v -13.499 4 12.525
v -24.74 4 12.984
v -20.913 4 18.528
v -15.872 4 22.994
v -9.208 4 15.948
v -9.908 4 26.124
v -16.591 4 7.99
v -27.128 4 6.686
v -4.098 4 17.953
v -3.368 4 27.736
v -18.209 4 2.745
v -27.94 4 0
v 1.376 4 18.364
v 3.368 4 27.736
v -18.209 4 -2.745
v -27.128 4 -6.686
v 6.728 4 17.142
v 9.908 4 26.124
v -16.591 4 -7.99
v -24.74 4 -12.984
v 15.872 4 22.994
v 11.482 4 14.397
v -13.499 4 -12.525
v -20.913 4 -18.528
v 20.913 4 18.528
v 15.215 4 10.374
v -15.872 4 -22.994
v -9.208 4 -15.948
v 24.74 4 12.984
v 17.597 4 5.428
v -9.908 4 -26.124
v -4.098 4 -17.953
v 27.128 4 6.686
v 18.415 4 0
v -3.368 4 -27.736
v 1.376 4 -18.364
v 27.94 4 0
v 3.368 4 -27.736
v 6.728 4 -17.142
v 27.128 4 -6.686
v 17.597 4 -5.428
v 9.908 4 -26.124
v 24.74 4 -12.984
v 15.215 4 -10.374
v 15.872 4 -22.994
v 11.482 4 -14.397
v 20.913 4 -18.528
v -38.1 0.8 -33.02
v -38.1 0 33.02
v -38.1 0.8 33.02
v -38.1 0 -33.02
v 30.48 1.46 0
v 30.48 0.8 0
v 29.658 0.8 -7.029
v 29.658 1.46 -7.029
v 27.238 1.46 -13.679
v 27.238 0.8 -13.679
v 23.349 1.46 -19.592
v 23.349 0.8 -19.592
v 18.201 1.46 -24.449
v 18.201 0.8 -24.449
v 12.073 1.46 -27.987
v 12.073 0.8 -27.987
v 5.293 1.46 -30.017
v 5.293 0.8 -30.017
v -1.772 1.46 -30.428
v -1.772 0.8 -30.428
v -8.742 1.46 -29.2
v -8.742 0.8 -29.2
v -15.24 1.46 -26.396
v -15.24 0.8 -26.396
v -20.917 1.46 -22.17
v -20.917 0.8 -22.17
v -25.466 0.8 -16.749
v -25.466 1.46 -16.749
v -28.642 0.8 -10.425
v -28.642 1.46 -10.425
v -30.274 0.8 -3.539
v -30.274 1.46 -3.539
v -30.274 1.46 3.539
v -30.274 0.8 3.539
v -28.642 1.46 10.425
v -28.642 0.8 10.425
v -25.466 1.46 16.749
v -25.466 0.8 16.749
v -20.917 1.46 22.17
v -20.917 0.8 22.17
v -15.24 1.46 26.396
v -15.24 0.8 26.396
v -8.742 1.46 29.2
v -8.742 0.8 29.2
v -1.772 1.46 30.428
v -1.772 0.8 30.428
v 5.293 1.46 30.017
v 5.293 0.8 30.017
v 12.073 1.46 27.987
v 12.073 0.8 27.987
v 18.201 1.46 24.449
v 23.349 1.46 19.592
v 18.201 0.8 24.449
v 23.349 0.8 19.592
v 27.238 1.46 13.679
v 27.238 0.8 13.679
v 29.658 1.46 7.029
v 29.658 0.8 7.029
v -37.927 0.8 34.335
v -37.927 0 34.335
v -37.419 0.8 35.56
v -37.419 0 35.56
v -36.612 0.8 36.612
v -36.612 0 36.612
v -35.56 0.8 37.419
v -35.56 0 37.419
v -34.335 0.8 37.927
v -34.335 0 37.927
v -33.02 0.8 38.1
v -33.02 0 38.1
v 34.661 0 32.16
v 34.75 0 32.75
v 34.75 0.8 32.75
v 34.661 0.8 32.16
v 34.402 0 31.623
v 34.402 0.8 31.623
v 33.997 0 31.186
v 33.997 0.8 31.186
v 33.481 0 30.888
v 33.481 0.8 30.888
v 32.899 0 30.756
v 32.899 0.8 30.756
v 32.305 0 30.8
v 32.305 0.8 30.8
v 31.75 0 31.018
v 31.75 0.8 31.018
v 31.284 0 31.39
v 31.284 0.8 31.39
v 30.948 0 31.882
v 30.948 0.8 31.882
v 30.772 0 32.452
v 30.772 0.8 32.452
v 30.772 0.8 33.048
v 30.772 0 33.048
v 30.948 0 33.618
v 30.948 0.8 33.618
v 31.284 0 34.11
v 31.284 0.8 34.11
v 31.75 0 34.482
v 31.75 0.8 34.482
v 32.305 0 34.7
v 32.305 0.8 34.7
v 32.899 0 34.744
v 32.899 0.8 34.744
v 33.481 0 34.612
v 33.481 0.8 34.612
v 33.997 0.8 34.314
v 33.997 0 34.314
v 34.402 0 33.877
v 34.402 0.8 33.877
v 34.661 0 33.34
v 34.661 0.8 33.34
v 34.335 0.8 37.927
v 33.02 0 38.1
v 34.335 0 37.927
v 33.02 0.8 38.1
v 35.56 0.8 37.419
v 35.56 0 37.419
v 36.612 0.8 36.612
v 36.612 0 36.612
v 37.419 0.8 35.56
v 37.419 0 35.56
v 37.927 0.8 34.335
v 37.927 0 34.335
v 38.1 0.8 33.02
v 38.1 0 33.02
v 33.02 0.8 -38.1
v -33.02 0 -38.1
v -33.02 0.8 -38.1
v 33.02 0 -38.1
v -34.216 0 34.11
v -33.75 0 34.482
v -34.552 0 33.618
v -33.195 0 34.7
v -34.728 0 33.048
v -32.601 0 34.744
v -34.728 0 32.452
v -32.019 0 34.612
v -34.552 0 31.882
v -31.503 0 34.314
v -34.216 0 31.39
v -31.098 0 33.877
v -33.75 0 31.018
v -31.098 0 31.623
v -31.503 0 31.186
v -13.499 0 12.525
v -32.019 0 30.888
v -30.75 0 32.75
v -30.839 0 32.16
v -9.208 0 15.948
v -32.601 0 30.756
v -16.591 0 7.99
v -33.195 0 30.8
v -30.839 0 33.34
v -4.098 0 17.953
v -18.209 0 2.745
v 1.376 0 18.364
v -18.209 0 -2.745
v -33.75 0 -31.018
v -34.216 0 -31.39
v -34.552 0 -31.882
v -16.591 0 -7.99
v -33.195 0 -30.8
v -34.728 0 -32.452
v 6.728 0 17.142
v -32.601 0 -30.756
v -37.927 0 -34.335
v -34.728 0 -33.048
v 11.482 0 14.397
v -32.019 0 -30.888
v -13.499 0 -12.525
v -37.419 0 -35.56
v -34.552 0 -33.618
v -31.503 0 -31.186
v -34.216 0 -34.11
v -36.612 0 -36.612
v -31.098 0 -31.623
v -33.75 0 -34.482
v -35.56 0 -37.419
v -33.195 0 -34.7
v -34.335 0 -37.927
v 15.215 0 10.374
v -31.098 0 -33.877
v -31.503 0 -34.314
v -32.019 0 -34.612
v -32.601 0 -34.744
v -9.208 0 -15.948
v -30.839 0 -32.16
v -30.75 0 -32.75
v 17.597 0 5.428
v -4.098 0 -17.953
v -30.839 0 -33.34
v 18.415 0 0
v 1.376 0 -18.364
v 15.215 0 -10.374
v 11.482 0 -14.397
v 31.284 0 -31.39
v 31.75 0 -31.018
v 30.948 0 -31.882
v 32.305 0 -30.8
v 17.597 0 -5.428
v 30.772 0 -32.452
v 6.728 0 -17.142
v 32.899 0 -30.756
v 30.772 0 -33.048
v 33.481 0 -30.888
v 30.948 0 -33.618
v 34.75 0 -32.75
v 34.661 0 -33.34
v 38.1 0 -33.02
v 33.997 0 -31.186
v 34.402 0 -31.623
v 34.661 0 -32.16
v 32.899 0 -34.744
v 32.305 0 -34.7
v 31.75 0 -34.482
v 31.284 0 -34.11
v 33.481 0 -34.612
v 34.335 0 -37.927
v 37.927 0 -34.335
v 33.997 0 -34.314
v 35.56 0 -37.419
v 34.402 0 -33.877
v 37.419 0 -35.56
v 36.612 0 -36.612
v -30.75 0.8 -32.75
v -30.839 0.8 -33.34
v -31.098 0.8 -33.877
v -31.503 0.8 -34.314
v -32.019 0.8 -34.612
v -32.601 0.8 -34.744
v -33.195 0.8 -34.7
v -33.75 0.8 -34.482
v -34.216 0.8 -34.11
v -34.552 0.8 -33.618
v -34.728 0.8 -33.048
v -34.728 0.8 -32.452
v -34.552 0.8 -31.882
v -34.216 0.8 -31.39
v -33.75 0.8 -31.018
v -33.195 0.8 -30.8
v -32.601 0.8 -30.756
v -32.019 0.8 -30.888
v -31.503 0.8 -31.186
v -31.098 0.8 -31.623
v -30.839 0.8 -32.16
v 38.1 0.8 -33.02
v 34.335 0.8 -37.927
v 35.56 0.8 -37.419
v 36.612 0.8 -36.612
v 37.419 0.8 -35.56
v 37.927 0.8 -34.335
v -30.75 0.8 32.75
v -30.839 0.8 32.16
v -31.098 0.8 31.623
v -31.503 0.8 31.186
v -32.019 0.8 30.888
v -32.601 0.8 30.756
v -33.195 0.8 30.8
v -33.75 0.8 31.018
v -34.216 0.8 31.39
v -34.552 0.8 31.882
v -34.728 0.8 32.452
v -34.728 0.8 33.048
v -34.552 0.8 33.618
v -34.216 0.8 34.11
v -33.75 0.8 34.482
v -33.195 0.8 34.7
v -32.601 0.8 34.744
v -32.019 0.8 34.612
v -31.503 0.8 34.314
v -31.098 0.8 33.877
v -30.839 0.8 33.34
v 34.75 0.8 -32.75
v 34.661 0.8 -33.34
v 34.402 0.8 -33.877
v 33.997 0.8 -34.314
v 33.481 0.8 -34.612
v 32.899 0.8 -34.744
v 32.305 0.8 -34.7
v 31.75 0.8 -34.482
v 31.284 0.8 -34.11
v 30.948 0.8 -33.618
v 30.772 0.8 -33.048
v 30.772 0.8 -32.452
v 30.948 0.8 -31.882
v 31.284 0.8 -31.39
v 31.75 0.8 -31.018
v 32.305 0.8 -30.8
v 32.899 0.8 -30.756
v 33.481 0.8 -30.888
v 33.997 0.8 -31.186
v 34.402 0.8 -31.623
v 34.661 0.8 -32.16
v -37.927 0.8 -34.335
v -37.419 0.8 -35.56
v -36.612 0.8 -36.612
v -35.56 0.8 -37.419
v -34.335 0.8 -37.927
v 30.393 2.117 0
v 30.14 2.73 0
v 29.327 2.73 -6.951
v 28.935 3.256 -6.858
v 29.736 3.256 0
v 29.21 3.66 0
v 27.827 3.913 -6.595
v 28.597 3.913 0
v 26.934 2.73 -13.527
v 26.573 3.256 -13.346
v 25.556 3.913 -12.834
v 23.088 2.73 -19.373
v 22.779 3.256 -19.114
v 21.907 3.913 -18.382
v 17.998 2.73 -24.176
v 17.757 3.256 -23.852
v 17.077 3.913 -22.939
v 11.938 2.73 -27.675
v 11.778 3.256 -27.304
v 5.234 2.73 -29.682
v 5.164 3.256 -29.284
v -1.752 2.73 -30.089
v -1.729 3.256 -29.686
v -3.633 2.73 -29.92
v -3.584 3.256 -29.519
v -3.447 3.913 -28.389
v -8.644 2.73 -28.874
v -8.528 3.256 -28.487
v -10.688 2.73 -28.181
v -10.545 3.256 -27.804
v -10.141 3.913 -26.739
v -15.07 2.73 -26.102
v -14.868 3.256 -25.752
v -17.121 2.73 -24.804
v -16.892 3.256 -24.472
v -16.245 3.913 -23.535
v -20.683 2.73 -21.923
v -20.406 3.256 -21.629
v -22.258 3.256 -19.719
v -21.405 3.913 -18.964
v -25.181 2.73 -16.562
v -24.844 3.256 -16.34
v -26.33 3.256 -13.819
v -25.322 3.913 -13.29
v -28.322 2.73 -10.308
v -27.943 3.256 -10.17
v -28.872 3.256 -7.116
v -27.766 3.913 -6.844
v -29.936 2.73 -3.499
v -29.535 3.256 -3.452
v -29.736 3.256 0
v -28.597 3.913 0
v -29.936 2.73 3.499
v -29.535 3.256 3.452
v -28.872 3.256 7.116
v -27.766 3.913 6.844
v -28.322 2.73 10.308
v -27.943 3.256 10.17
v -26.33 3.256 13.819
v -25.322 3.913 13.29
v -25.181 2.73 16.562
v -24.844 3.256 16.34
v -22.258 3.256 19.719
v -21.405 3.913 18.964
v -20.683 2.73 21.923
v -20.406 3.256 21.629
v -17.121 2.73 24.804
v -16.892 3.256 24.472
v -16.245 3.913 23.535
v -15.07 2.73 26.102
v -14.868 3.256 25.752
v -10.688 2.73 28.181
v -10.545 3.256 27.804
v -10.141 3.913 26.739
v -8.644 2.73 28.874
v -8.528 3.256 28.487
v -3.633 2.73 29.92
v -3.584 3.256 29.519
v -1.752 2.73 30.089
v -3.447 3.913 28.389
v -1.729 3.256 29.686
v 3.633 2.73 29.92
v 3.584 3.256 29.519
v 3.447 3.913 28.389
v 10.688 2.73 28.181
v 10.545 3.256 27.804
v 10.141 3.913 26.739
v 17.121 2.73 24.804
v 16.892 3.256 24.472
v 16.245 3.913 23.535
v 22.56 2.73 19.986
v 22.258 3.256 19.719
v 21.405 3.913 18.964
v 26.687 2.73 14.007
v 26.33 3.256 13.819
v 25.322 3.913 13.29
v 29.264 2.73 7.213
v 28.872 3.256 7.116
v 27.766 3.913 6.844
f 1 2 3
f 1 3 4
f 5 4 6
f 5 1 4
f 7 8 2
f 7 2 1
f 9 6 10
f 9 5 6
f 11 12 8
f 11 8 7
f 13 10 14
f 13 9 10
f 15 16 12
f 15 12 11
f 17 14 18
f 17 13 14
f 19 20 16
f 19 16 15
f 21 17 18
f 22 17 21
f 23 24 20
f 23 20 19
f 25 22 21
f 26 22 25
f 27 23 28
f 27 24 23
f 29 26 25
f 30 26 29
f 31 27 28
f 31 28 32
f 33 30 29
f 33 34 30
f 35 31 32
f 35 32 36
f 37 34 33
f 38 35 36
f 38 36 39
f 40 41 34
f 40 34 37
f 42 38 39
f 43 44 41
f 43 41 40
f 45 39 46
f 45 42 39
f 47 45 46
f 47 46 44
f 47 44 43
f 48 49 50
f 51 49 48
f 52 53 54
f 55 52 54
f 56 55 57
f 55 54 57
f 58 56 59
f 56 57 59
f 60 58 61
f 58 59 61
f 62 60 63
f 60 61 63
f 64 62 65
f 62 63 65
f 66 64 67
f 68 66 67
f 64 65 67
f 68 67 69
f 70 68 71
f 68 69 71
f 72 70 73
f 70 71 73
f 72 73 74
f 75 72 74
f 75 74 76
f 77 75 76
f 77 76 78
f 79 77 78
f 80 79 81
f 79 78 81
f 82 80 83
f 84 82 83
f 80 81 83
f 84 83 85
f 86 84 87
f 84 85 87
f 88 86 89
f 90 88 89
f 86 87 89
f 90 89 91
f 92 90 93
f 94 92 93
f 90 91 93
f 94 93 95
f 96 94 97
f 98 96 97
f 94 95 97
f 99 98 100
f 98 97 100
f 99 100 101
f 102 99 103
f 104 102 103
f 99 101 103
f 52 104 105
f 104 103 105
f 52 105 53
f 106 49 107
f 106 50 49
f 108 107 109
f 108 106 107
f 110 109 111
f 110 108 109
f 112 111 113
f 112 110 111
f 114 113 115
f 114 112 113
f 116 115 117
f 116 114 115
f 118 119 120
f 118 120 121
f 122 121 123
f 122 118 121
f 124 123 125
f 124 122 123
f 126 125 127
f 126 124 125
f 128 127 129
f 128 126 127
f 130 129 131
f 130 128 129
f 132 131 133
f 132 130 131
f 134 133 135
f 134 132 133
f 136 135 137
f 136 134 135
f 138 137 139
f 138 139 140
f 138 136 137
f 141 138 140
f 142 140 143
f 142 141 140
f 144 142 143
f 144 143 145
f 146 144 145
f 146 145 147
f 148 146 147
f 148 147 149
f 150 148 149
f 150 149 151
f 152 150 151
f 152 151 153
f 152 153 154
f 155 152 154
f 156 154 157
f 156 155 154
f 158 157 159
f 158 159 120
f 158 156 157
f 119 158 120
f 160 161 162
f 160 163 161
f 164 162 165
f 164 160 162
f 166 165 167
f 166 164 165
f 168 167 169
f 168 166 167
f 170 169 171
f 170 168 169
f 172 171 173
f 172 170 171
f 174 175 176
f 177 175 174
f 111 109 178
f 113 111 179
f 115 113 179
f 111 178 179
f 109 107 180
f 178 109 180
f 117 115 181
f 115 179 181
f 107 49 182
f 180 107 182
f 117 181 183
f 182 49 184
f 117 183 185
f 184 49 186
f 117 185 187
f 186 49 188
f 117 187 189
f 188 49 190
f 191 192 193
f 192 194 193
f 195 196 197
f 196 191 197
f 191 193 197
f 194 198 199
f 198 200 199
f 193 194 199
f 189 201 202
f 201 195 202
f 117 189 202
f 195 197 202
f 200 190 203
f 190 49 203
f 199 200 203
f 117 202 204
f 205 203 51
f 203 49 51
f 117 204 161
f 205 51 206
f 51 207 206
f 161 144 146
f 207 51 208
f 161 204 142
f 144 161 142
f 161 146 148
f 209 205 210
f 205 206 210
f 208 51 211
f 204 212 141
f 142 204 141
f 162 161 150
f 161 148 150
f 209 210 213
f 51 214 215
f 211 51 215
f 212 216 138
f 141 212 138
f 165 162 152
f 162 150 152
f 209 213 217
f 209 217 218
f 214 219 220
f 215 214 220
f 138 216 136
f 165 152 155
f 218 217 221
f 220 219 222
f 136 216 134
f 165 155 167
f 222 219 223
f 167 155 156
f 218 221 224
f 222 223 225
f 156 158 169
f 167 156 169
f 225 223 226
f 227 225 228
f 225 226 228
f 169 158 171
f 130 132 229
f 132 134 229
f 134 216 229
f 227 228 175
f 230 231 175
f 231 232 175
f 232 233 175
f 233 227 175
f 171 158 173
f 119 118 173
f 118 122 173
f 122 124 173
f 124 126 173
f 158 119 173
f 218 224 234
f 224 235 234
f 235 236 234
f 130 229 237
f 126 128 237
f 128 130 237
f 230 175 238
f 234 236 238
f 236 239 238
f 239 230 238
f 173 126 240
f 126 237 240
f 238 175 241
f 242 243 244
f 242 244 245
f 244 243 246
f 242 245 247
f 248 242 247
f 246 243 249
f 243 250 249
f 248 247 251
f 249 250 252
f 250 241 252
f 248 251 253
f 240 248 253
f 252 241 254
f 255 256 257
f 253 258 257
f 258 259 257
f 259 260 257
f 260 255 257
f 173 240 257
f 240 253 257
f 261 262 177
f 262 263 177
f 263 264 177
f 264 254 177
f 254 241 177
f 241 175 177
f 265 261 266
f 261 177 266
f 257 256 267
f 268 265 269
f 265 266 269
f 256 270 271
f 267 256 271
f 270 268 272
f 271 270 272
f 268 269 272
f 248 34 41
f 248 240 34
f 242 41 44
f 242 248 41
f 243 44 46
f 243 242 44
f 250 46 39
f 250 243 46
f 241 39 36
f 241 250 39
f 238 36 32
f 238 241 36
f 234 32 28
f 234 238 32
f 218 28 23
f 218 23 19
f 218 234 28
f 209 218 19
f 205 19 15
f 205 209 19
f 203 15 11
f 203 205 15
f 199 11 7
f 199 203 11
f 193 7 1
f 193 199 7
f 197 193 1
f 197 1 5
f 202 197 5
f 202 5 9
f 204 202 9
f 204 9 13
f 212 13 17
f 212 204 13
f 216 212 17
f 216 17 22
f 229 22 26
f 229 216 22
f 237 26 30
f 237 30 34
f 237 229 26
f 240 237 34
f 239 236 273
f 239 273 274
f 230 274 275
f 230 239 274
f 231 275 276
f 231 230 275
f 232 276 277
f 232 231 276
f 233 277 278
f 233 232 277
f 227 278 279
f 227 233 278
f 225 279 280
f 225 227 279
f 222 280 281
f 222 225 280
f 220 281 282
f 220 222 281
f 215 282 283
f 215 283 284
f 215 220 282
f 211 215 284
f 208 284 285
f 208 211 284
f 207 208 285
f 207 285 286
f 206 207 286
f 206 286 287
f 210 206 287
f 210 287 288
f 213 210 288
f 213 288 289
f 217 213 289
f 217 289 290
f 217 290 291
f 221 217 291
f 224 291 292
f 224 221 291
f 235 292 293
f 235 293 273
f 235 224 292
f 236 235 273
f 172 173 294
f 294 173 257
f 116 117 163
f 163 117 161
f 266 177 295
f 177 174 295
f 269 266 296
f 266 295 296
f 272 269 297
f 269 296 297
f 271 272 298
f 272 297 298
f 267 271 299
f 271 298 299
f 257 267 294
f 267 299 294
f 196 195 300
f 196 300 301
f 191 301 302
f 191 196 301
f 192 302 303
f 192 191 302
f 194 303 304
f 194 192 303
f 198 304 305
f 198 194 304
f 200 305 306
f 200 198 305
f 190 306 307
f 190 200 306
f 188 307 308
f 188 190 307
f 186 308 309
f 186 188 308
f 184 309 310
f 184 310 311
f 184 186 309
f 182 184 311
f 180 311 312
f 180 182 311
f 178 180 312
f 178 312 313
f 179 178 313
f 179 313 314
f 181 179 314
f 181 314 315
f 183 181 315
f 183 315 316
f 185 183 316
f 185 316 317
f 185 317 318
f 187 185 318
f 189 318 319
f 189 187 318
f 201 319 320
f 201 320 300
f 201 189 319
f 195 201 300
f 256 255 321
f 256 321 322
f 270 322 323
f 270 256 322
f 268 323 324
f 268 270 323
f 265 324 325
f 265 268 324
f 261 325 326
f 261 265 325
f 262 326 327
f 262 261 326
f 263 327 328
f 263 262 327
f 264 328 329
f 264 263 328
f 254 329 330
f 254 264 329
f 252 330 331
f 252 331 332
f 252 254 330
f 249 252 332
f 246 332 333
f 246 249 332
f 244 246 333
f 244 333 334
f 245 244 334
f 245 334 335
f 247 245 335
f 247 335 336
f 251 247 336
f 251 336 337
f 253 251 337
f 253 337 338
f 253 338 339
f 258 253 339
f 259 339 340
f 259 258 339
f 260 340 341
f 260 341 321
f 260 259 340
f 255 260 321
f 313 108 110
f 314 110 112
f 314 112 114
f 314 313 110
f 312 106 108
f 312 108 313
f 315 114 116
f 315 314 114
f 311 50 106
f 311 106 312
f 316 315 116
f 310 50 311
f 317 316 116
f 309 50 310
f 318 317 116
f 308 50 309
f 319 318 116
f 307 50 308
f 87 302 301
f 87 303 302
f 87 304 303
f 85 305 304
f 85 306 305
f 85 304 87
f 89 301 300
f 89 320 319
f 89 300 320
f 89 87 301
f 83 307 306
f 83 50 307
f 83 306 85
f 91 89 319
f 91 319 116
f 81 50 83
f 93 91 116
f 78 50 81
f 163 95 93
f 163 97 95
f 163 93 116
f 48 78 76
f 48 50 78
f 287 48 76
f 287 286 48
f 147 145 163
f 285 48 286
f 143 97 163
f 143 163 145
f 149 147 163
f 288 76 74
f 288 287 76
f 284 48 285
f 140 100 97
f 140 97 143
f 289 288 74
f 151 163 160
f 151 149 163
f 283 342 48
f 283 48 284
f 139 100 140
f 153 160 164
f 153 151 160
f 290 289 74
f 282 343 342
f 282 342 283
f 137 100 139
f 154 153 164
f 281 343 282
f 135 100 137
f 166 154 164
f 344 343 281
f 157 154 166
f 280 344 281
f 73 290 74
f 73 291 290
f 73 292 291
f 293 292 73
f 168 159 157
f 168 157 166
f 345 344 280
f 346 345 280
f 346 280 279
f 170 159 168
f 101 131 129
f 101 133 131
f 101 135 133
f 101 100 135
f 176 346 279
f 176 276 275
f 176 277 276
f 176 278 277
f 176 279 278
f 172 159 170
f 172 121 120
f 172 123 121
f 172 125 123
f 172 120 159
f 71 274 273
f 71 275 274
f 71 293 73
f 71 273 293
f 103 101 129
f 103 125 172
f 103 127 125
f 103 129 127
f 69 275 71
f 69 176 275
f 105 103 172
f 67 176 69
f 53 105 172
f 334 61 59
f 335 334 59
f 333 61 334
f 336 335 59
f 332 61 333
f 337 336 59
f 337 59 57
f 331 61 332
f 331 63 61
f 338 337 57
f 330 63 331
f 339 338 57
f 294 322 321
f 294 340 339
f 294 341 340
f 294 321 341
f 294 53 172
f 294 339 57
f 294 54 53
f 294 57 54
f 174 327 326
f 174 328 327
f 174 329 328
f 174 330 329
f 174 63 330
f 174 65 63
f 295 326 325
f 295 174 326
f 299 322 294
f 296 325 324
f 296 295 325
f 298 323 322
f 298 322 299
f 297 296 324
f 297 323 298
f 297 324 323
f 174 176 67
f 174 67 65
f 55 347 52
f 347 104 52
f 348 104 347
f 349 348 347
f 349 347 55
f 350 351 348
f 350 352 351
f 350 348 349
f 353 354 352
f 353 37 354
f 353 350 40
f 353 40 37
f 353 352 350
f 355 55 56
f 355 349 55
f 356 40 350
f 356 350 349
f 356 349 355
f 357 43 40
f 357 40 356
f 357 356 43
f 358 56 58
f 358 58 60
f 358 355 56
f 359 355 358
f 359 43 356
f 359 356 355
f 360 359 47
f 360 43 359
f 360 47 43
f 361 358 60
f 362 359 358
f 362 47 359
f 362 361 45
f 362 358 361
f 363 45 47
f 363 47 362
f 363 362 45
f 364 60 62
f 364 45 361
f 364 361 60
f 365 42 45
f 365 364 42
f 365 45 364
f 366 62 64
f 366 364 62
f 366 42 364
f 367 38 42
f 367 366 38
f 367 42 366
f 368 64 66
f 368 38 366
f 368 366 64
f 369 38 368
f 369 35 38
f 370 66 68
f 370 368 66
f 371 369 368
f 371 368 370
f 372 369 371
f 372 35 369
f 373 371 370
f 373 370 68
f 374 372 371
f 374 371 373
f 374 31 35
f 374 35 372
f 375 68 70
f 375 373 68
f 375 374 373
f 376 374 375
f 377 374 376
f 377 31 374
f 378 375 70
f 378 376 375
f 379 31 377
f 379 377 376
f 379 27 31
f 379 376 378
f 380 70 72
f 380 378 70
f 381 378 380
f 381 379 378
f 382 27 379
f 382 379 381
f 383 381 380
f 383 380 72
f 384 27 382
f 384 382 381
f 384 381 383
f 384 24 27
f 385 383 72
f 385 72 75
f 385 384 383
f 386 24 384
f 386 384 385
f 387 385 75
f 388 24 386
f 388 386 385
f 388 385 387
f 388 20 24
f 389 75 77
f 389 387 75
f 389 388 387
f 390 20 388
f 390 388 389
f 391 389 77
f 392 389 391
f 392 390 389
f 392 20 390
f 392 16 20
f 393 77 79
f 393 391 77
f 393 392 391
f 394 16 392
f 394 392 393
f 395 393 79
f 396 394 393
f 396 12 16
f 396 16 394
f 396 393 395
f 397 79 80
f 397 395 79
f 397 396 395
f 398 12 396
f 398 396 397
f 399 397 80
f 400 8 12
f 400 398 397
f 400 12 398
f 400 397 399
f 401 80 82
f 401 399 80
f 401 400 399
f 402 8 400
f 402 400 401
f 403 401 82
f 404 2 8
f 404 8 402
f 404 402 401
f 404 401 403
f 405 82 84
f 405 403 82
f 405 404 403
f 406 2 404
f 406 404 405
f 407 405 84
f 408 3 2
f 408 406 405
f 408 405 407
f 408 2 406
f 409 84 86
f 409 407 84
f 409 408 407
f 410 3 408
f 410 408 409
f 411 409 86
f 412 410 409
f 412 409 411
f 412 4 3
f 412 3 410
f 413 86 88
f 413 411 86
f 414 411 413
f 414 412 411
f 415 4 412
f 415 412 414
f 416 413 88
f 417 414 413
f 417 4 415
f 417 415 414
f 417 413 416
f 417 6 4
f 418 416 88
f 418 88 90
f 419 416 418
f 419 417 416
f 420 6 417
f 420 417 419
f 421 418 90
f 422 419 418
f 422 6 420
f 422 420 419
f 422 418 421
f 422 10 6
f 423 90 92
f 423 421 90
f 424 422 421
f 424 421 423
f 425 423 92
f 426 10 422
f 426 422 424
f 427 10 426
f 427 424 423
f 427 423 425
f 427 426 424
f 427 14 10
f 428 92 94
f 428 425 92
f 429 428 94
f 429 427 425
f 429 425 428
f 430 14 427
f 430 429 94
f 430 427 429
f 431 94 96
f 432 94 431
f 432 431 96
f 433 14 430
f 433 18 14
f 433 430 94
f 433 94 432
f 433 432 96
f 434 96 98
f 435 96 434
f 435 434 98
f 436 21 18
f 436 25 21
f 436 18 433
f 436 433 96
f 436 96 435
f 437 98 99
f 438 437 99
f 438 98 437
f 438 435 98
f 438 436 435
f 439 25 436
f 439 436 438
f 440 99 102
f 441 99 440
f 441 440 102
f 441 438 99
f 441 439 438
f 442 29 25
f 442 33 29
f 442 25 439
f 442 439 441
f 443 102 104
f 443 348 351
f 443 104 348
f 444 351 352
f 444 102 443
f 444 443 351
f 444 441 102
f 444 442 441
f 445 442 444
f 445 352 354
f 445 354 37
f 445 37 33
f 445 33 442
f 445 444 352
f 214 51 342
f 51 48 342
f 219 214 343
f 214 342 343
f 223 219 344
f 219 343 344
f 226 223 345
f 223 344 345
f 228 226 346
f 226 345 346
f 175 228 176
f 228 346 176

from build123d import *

# Parameters (mm, degrees)
SKETCH1_W           = 76.2
SKETCH1_H           = 76.2
SKETCH1_R           = 2.000000064
SKETCH1_R_2         = 18.415
BOSS_EXTRUDE1_DEPTH = 0.8
FILLET1_R           = 5.08
SKETCH2_R           = 30.48
SKETCH2_R_2         = 18.415
BOSS_EXTRUDE2_DEPTH = 3.2
FILLET2_R           = 2.54


with BuildPart() as part:
    # Sketch1 → Boss-Extrude1 (new body)
    with BuildSketch(Plane(origin=(0, 0, 0), x_dir=(1, 0, 0), z_dir=(0, 1, 0))):
        Rectangle(SKETCH1_W, SKETCH1_H)
        with Locations((-32.75, 32.75)):
            Circle(SKETCH1_R, mode=Mode.SUBTRACT)
        with Locations((32.75, 32.75)):
            Circle(SKETCH1_R, mode=Mode.SUBTRACT)
        with Locations((32.75, -32.75)):
            Circle(SKETCH1_R, mode=Mode.SUBTRACT)
        with Locations((-32.75, -32.75)):
            Circle(SKETCH1_R, mode=Mode.SUBTRACT)
        Circle(SKETCH1_R_2, mode=Mode.SUBTRACT)
    extrude(amount=BOSS_EXTRUDE1_DEPTH)

    # Fillet1
    fillet1_edges = [part.edges().sort_by_distance(p)[0] for p in [
        (38.1, 0.4, 38.1),
        (-38.1, 0.4, 38.1),
        (-38.1, 0.4, -38.1),
        (38.1, 0.4, -38.1),
    ]]
    fillet(fillet1_edges, radius=FILLET1_R)

    # Sketch2 → Boss-Extrude2 (add)
    with BuildSketch(Plane(origin=(0, 0.8, 0), x_dir=(1, 0, 0), z_dir=(0, 1, 0))):
        Circle(SKETCH2_R)
        Circle(SKETCH2_R_2, mode=Mode.SUBTRACT)
    extrude(amount=BOSS_EXTRUDE2_DEPTH)

    # Fillet2
    fillet2_edges = [part.edges().sort_by_distance(p)[0] for p in [
        (-30.48, 4, 0),
    ]]
    fillet(fillet2_edges, radius=FILLET2_R)


solid = part.part
